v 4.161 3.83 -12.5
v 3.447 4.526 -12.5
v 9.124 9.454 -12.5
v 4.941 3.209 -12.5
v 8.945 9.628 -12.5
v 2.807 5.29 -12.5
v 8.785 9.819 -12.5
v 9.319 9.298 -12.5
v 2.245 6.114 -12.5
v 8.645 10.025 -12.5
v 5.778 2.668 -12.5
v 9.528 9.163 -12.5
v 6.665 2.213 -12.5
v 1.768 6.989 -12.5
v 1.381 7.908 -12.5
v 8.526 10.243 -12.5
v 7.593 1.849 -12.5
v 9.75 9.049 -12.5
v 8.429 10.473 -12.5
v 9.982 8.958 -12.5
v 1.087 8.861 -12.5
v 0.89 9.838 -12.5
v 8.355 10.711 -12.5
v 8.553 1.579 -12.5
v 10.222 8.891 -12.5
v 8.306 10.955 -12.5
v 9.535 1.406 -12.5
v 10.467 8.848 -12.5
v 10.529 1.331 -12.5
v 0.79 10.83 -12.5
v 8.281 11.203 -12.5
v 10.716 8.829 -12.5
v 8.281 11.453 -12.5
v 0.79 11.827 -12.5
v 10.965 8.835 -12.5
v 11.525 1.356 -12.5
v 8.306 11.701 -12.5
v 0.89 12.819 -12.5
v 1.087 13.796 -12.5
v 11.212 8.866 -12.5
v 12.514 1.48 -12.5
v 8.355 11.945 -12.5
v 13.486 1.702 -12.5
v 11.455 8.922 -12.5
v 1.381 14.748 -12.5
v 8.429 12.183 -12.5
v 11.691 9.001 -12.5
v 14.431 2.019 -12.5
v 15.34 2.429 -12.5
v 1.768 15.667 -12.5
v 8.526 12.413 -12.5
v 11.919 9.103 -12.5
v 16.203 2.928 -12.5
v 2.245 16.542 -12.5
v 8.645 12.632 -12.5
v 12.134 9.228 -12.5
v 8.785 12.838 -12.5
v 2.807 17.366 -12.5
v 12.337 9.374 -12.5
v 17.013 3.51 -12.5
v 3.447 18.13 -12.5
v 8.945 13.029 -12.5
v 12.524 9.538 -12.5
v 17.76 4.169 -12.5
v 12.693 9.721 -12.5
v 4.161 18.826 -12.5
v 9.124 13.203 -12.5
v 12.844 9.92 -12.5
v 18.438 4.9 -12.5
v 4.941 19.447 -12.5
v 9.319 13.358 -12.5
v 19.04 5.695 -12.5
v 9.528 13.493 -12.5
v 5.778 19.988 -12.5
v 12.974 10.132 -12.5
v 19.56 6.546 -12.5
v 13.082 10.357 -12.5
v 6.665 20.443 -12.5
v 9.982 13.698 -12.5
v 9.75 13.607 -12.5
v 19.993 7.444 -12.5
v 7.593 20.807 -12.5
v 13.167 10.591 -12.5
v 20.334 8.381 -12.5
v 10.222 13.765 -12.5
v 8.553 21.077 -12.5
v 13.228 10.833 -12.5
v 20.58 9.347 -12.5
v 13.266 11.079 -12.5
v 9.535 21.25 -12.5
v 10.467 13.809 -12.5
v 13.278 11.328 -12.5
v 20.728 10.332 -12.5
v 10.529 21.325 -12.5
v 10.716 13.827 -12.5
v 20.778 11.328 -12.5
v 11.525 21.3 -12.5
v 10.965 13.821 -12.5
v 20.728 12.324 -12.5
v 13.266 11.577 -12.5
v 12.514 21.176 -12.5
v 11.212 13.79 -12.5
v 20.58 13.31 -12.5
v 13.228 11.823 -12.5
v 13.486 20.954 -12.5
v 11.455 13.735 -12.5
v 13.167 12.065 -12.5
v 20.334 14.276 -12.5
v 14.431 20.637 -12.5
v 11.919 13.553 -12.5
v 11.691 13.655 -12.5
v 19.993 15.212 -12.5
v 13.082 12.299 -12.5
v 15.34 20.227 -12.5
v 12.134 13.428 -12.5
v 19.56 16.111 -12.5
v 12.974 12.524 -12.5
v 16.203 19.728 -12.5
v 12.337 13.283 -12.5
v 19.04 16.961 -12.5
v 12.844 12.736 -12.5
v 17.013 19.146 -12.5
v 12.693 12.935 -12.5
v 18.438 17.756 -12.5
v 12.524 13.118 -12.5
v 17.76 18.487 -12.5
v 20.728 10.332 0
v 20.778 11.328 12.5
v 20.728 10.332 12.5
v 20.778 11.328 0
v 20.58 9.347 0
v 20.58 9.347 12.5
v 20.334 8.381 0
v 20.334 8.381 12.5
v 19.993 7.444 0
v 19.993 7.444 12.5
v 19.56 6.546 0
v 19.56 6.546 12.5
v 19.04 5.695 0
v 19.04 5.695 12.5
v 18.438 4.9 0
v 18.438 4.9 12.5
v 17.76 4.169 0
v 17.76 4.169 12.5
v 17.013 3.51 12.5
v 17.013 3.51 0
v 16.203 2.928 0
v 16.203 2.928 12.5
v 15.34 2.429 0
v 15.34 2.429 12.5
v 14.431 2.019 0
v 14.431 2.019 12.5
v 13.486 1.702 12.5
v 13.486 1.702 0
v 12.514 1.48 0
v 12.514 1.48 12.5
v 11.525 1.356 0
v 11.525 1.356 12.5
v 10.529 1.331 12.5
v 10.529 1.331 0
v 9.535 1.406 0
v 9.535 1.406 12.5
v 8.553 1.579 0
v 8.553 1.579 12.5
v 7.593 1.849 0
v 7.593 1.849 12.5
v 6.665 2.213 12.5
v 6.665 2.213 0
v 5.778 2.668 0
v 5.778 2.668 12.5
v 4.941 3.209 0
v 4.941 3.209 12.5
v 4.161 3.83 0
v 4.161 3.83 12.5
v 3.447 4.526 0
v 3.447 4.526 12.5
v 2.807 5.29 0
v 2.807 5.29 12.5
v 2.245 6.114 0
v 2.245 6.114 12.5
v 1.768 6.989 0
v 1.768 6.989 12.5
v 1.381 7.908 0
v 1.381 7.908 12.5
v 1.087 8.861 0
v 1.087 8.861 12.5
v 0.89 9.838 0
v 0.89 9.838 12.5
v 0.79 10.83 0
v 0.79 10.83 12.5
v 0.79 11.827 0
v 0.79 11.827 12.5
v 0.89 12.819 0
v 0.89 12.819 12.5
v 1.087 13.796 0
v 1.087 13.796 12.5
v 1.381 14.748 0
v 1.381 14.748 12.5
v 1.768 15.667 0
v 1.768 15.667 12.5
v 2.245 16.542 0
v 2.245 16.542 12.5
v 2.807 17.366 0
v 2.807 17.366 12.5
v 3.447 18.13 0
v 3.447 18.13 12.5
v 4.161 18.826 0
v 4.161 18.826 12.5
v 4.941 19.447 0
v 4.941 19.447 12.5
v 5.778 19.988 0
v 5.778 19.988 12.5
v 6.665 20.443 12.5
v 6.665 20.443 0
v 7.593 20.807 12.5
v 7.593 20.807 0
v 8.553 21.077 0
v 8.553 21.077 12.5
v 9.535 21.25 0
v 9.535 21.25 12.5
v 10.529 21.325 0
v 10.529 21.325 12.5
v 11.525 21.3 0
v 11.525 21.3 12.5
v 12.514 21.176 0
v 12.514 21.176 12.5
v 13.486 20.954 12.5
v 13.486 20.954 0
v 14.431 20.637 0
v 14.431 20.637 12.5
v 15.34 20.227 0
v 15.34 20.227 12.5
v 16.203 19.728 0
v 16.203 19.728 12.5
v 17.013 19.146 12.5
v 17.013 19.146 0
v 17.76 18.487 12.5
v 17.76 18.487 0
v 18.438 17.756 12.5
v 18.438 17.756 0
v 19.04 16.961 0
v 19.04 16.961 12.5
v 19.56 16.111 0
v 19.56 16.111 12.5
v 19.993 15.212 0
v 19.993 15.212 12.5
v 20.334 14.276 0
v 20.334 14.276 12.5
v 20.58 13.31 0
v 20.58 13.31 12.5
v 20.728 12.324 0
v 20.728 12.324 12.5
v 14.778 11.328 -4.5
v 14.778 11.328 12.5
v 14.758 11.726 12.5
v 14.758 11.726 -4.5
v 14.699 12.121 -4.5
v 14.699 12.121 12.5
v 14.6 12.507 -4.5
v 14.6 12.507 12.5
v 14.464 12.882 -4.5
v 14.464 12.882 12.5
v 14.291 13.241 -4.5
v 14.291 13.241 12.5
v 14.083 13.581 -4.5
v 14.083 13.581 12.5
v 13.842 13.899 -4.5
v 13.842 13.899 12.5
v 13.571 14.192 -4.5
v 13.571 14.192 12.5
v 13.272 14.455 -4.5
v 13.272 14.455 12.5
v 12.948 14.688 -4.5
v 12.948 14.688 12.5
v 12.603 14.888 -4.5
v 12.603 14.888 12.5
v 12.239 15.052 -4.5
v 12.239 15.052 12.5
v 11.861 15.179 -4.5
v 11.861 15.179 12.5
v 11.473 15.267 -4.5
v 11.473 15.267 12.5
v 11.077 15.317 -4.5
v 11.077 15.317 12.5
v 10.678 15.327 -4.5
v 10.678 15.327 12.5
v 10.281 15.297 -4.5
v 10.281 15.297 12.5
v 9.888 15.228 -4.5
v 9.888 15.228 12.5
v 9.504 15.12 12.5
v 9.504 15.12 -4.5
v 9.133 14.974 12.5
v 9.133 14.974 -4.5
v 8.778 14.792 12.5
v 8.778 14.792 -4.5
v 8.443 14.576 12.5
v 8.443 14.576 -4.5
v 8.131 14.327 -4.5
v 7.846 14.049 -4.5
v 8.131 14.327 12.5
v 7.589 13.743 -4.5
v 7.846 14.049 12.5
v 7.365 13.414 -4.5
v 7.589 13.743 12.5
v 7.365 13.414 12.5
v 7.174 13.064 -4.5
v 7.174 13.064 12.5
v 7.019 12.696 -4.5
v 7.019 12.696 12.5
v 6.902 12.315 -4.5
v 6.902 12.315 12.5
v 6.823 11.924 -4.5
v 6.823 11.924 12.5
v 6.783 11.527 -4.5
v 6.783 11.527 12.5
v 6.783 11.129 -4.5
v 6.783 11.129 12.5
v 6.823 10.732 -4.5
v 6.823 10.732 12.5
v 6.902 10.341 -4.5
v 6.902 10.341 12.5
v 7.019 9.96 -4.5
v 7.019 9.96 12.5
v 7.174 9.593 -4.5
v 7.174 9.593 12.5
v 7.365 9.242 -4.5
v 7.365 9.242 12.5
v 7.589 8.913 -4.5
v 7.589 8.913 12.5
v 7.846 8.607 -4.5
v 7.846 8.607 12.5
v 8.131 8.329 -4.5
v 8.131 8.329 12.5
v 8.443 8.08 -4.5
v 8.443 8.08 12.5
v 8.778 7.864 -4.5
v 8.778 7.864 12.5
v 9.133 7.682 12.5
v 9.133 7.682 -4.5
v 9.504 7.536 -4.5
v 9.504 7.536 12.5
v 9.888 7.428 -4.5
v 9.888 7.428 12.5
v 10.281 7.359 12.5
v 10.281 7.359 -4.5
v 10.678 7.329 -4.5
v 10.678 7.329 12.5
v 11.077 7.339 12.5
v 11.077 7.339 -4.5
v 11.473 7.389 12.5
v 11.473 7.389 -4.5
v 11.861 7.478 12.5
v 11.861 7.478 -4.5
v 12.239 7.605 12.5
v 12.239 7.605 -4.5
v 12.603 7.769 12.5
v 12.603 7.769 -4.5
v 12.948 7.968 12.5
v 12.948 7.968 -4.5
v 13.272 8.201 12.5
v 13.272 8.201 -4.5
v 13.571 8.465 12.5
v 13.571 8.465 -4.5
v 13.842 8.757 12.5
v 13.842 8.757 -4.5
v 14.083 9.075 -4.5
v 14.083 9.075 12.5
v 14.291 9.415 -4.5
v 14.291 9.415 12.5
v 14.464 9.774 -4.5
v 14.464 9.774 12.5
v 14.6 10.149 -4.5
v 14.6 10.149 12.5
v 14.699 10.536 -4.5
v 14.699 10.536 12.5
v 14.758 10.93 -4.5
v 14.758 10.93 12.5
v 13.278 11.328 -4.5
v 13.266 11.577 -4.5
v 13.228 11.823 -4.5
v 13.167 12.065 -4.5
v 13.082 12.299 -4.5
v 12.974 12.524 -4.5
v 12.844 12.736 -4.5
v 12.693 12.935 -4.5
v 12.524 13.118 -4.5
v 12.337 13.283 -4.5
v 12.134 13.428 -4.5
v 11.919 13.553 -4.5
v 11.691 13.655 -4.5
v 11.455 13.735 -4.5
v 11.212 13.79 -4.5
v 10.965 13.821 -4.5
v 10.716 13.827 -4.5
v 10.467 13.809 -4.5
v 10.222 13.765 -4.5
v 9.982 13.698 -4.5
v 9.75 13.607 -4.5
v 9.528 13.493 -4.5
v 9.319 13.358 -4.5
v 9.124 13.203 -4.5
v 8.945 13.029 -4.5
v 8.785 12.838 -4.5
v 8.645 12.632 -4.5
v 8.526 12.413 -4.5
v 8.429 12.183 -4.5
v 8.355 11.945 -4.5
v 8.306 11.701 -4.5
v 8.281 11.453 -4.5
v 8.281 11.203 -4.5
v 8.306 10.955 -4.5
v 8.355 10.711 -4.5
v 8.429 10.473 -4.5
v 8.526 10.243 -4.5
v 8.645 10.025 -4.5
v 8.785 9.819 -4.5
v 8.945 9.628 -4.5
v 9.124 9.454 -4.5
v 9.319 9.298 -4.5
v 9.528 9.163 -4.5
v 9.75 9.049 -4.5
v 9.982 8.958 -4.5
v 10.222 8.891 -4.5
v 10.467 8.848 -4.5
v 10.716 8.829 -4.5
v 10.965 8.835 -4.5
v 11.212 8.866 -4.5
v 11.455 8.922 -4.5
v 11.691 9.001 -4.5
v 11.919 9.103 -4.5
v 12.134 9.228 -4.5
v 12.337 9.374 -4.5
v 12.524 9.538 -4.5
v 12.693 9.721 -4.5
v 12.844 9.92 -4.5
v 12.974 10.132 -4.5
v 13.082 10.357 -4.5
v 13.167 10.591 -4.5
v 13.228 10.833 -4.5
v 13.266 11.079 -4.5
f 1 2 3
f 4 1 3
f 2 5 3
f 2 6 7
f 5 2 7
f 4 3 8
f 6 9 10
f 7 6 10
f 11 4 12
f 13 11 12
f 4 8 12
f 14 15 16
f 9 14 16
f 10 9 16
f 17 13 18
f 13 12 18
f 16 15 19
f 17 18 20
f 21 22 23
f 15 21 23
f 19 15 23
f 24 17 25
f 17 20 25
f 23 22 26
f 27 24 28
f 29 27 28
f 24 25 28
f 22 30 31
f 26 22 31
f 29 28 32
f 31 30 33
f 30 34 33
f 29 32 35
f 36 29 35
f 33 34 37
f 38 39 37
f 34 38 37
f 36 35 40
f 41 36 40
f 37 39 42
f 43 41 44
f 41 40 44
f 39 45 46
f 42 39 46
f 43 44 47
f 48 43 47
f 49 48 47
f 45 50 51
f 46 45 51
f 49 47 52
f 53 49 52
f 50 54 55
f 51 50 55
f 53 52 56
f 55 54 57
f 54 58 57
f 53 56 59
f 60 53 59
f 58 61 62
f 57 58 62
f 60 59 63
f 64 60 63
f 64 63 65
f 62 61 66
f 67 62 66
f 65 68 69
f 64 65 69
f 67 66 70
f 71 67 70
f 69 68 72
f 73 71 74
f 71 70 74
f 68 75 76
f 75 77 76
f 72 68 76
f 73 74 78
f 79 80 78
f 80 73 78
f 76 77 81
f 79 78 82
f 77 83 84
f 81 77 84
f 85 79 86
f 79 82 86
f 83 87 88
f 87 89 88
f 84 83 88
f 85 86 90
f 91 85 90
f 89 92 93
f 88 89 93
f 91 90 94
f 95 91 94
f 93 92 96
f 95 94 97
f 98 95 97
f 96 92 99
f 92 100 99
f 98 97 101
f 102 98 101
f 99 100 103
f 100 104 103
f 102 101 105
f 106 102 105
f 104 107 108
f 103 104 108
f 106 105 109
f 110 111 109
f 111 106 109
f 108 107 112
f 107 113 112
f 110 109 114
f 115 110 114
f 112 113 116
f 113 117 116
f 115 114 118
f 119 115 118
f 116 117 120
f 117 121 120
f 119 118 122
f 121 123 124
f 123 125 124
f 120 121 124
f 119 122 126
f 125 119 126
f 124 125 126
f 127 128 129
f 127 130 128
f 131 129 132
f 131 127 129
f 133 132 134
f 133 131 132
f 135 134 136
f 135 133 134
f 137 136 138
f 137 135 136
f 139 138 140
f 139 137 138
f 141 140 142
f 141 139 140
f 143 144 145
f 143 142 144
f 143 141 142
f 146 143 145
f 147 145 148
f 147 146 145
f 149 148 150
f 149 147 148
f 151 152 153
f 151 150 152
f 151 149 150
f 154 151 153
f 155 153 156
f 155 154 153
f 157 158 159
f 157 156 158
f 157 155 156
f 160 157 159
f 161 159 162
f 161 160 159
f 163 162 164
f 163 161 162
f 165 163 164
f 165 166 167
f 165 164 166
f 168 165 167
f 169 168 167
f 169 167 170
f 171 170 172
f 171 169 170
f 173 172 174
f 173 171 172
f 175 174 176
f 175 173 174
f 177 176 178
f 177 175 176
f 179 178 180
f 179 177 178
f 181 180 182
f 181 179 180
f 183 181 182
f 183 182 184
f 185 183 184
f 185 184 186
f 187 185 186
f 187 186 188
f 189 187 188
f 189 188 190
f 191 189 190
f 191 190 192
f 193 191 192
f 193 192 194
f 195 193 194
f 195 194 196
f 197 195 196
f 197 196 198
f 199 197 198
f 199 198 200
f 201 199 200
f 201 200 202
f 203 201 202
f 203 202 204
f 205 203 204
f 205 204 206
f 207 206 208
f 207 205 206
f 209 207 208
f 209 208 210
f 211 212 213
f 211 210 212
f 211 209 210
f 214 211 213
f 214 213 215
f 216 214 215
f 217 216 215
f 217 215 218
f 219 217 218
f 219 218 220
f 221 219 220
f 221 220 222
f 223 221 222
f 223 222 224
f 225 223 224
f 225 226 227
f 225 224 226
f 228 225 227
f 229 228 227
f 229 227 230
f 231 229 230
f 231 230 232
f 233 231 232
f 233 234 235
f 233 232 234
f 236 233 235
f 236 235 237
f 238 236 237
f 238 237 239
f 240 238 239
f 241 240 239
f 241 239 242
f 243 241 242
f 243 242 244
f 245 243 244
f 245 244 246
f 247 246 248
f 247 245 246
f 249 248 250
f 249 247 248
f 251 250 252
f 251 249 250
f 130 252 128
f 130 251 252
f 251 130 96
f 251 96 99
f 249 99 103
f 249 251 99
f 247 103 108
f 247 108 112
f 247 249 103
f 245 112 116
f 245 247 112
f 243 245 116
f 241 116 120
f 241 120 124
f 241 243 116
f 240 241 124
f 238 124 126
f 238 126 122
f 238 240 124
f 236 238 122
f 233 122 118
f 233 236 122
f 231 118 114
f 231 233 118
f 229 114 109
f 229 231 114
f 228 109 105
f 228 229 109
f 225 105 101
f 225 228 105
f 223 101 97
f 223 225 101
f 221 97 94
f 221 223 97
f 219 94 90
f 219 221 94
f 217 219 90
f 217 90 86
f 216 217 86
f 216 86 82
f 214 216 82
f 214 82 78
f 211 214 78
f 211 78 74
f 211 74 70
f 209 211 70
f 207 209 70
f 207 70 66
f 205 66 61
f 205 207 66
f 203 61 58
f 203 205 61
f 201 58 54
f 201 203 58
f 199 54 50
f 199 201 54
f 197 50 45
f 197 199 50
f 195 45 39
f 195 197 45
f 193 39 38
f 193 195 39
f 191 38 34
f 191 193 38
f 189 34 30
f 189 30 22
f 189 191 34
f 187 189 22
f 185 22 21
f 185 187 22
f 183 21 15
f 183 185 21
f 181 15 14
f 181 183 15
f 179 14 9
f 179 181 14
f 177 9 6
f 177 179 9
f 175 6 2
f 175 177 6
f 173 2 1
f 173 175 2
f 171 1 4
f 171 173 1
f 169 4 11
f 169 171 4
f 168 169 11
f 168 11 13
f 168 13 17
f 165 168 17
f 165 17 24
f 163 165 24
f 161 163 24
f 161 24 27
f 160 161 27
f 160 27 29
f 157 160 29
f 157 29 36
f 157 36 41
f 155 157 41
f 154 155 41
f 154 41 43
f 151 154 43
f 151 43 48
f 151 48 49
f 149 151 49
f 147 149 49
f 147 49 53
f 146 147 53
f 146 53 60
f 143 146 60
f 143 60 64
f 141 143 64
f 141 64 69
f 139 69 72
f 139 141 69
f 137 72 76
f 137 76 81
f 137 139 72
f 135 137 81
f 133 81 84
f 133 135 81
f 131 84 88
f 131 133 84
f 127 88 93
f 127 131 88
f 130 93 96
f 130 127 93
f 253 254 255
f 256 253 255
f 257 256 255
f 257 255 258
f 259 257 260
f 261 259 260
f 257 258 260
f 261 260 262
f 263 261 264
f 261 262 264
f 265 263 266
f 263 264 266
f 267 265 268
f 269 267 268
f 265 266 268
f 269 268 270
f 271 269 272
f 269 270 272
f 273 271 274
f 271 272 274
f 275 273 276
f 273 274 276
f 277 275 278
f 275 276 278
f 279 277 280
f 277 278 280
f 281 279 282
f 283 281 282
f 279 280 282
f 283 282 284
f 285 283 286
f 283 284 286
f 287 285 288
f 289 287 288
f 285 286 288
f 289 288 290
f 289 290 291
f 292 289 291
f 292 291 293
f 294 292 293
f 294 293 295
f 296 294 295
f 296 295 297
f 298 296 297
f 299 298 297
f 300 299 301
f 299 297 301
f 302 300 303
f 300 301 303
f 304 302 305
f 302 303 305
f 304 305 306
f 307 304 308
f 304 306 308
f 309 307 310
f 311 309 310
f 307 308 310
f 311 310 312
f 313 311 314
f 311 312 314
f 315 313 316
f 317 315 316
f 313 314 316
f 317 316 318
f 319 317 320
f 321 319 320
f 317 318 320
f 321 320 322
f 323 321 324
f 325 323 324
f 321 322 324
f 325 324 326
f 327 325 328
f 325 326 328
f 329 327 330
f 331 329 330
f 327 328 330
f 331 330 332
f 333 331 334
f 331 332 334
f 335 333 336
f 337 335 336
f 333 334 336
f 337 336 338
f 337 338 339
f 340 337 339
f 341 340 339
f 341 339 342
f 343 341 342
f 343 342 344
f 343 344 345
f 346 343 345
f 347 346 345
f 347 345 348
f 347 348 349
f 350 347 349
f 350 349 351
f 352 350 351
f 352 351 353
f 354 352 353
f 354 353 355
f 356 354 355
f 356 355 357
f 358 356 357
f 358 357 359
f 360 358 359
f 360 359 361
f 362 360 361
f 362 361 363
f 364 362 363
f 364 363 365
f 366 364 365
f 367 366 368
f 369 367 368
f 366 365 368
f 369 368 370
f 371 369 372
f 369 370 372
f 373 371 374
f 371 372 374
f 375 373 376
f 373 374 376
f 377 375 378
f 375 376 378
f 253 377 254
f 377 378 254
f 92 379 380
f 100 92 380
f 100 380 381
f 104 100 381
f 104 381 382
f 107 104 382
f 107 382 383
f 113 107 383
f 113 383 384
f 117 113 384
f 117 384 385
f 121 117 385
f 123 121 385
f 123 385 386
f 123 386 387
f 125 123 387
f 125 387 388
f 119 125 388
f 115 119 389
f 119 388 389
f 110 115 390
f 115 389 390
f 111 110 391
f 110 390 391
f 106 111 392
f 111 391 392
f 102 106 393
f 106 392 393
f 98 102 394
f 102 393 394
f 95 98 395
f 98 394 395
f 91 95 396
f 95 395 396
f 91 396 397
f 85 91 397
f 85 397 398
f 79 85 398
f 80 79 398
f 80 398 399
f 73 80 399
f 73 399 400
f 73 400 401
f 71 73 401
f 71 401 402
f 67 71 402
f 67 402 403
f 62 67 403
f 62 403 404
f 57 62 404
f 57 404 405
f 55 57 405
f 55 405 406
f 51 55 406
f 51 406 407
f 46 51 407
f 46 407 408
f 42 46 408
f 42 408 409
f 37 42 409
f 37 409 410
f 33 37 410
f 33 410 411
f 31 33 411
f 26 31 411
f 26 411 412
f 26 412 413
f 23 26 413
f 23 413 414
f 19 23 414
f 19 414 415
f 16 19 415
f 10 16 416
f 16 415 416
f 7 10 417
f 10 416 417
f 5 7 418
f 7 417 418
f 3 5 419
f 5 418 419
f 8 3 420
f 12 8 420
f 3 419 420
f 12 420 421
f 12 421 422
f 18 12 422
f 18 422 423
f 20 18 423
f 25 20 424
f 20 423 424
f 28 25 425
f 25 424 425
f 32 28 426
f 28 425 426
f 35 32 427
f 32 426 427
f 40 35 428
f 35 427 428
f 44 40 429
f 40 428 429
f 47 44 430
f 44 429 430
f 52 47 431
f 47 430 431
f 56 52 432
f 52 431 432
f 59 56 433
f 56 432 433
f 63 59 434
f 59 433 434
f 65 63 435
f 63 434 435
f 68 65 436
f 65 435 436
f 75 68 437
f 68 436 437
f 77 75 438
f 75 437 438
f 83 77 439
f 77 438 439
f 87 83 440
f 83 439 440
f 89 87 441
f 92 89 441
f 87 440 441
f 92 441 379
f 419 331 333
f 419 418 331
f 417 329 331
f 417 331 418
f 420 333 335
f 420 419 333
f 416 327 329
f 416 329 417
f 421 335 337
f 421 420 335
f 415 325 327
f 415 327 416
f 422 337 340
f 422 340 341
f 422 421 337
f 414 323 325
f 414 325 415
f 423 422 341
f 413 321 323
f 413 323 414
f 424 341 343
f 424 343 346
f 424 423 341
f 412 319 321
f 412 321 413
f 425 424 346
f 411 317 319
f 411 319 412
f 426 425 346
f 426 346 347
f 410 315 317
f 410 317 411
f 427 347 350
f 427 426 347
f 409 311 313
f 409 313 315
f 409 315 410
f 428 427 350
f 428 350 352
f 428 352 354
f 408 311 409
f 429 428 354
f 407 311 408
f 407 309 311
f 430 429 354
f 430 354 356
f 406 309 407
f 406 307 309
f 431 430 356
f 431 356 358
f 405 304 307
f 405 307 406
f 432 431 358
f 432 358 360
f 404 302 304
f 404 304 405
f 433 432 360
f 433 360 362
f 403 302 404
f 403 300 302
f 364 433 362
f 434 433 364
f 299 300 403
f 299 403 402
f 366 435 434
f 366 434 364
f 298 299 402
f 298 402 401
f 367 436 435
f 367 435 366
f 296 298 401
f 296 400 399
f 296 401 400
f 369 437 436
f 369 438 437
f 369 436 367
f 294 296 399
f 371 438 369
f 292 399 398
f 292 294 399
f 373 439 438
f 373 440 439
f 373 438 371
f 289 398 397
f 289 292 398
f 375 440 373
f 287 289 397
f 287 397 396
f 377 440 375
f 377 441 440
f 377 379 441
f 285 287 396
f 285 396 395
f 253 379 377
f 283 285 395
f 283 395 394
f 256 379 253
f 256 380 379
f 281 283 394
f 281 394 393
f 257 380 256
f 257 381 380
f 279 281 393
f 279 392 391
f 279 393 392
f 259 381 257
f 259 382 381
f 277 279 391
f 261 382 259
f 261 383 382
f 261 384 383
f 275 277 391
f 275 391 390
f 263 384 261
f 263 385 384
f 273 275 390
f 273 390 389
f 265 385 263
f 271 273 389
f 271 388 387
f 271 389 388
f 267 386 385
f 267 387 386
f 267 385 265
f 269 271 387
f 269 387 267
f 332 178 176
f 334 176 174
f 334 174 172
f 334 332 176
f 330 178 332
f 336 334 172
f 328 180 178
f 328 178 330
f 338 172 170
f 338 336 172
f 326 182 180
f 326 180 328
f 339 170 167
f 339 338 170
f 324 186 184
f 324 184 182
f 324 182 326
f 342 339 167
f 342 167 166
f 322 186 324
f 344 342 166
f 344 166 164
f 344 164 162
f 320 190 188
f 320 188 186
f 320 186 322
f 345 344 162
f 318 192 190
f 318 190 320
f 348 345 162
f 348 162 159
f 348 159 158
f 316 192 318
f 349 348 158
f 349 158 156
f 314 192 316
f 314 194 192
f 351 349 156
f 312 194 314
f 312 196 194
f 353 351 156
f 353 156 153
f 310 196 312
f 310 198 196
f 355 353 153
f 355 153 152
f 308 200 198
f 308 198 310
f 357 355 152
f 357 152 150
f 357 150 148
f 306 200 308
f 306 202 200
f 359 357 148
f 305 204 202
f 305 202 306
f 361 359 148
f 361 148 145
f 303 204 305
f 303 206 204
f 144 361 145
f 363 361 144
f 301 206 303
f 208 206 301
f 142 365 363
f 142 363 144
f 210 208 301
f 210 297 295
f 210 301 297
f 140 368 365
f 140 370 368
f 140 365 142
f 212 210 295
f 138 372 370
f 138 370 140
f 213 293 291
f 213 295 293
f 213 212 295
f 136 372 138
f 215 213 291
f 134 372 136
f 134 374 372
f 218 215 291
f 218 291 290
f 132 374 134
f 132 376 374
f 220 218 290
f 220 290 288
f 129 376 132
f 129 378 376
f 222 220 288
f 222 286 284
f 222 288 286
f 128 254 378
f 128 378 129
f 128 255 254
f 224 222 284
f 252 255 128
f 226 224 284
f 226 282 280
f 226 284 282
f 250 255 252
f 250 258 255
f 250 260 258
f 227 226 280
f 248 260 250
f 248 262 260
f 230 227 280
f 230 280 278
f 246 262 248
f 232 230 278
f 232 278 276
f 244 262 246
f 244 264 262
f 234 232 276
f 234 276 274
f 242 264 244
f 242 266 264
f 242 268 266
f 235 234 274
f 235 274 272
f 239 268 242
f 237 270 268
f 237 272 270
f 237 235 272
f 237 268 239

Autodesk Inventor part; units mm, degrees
ref_plane "YZ Plane" through (0, 0, 0) normal (1, 0, 0) x (0, 1, 0)
ref_plane "XZ Plane" through (0, 0, 0) normal (0, 1, 0) x (-1, 0, 0)
ref_plane "XY Plane" through (0, 0, 0) normal (0, 0, 1) x (1, 0, 0)
sketch "Sketch1" plane through (0, 0, 0) normal (0, 0, 1) x (1, 0, 0)
  circle A0 centre (10.778, 11.3281) radius 10
  point P0 (0, 0)
  dimension "d0" = 20
extrude "Extrusion1" add sketch "Sketch1" along normal mid plane 25
sketch "Sketch2" plane through (10.778, 11.3281, 12.5) normal (0, 0, 1) x (1, 0, 0)
  circle A0 centre (0, 0) radius 2.5
  circle A1 centre (0, 0) radius 4
  point P0 (-10.778, -11.3281)
  dimension "d5" = 5
  dimension "d6" = 8
extrude "Extrusion2" cut sketch "Sketch2" against normal through all contours A0
extrude "Extrusion3" cut sketch "Sketch2" against normal blind 17
properties part number "Shaft Coupler 5mm 8mm"
